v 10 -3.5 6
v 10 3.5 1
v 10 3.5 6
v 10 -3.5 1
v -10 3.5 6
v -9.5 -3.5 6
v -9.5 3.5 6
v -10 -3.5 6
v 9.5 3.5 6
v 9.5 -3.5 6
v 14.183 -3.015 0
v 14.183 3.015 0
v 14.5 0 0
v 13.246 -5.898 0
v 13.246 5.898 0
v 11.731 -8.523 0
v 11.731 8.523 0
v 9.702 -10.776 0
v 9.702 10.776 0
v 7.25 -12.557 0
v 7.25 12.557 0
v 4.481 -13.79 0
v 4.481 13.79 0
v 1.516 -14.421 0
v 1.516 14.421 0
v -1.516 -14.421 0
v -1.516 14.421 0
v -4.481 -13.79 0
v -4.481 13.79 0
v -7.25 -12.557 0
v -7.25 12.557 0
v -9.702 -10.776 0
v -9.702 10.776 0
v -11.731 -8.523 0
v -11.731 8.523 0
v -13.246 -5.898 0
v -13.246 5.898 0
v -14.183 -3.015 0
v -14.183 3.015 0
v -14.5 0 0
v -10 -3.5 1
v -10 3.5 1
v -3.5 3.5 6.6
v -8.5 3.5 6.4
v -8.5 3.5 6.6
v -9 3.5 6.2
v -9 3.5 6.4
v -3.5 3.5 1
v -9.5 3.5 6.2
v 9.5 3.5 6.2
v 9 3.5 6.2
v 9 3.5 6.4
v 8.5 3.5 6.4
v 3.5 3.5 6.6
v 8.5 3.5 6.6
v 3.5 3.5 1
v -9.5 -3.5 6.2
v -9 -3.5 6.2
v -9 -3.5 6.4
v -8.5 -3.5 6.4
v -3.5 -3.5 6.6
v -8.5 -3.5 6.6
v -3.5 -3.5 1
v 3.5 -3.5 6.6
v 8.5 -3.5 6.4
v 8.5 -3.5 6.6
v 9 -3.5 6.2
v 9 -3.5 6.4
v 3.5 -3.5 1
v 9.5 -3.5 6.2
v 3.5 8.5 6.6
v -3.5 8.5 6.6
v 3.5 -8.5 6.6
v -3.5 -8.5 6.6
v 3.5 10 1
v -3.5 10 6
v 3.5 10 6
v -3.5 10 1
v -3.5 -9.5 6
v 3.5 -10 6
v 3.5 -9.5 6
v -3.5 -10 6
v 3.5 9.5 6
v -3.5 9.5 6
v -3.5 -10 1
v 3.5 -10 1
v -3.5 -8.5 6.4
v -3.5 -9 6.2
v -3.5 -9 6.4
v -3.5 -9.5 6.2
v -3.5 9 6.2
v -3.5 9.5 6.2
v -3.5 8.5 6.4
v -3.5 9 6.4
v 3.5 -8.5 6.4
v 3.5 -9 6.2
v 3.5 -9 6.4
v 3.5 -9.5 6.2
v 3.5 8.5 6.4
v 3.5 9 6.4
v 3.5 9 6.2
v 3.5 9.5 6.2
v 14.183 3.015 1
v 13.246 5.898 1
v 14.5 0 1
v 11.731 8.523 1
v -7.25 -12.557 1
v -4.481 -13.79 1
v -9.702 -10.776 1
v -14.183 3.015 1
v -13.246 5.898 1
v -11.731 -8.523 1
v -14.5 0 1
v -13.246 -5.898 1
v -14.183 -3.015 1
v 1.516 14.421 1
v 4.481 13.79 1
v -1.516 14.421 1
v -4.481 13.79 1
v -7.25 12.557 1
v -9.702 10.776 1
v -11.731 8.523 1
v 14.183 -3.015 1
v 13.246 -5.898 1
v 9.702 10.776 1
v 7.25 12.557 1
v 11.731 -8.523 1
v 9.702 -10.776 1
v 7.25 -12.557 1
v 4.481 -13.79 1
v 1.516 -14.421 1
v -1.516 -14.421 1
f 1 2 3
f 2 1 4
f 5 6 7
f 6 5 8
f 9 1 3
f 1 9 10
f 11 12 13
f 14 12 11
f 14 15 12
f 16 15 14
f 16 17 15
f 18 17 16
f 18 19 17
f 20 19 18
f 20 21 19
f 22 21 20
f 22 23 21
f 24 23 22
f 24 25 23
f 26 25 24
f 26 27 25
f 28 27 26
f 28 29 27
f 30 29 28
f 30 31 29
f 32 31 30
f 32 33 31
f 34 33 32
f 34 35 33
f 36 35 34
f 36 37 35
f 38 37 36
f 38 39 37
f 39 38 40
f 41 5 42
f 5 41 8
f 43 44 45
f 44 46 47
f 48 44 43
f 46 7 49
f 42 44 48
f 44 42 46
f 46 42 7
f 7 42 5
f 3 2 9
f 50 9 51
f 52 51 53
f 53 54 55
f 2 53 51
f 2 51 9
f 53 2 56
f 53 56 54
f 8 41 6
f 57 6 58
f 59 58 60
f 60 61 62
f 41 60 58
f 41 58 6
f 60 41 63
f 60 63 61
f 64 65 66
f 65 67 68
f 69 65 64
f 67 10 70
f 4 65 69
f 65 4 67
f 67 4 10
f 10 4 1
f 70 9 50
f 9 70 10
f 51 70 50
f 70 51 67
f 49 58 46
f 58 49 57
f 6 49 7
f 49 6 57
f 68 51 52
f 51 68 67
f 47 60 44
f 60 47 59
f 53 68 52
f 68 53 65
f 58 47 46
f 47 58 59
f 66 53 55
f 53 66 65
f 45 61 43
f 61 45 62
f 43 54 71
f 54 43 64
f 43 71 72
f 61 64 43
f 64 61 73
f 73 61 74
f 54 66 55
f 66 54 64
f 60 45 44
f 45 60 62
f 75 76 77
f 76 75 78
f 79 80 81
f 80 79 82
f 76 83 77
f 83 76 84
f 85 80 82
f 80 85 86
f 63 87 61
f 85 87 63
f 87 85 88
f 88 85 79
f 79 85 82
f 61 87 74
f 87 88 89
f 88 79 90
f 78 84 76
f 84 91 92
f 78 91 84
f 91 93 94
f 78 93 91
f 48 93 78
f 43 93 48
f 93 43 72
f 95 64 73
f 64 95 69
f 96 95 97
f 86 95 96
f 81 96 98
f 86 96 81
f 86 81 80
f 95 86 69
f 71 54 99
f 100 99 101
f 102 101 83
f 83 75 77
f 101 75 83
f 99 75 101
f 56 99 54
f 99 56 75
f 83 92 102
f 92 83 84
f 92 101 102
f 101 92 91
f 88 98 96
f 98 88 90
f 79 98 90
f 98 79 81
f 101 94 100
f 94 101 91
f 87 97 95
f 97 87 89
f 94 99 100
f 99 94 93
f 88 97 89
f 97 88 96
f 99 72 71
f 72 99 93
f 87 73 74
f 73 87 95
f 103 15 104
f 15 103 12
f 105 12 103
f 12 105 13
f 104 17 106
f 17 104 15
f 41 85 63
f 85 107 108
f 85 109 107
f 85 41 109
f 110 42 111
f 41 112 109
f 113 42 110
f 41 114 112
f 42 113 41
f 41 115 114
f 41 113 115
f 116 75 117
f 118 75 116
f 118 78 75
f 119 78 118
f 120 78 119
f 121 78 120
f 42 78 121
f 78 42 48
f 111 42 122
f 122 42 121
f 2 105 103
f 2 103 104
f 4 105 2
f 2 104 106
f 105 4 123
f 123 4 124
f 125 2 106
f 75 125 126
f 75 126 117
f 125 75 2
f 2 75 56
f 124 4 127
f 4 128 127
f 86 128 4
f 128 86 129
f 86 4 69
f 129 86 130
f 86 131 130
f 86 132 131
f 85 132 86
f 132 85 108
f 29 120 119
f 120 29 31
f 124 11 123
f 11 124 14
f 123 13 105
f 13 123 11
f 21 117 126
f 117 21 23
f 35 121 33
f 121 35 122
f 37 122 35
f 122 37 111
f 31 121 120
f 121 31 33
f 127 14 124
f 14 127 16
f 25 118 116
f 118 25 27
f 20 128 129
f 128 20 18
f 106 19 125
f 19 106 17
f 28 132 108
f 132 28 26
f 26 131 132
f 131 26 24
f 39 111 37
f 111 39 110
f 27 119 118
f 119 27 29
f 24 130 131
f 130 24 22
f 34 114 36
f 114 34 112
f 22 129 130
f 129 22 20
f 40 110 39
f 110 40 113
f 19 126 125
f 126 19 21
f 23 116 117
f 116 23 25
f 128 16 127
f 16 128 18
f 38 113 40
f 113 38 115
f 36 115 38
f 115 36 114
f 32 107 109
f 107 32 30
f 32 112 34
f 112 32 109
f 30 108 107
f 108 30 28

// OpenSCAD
cylinder (r=14.5,h=1);

module button () {
  translate ([-10, -(7/2), 0]) {
    cube([20,7,6]);
    translate ([0.5,0,6]) {
      cube([19,7,0.2]);
    }
    translate ([1,0,6.2]) {
      cube([18,7,0.2]);
    }
    translate ([1.5,0,6.4]) {
      cube([17,7,0.2]);
    }

  }
}

button ();

rotate ([0,0,90]){
  button ();
}
